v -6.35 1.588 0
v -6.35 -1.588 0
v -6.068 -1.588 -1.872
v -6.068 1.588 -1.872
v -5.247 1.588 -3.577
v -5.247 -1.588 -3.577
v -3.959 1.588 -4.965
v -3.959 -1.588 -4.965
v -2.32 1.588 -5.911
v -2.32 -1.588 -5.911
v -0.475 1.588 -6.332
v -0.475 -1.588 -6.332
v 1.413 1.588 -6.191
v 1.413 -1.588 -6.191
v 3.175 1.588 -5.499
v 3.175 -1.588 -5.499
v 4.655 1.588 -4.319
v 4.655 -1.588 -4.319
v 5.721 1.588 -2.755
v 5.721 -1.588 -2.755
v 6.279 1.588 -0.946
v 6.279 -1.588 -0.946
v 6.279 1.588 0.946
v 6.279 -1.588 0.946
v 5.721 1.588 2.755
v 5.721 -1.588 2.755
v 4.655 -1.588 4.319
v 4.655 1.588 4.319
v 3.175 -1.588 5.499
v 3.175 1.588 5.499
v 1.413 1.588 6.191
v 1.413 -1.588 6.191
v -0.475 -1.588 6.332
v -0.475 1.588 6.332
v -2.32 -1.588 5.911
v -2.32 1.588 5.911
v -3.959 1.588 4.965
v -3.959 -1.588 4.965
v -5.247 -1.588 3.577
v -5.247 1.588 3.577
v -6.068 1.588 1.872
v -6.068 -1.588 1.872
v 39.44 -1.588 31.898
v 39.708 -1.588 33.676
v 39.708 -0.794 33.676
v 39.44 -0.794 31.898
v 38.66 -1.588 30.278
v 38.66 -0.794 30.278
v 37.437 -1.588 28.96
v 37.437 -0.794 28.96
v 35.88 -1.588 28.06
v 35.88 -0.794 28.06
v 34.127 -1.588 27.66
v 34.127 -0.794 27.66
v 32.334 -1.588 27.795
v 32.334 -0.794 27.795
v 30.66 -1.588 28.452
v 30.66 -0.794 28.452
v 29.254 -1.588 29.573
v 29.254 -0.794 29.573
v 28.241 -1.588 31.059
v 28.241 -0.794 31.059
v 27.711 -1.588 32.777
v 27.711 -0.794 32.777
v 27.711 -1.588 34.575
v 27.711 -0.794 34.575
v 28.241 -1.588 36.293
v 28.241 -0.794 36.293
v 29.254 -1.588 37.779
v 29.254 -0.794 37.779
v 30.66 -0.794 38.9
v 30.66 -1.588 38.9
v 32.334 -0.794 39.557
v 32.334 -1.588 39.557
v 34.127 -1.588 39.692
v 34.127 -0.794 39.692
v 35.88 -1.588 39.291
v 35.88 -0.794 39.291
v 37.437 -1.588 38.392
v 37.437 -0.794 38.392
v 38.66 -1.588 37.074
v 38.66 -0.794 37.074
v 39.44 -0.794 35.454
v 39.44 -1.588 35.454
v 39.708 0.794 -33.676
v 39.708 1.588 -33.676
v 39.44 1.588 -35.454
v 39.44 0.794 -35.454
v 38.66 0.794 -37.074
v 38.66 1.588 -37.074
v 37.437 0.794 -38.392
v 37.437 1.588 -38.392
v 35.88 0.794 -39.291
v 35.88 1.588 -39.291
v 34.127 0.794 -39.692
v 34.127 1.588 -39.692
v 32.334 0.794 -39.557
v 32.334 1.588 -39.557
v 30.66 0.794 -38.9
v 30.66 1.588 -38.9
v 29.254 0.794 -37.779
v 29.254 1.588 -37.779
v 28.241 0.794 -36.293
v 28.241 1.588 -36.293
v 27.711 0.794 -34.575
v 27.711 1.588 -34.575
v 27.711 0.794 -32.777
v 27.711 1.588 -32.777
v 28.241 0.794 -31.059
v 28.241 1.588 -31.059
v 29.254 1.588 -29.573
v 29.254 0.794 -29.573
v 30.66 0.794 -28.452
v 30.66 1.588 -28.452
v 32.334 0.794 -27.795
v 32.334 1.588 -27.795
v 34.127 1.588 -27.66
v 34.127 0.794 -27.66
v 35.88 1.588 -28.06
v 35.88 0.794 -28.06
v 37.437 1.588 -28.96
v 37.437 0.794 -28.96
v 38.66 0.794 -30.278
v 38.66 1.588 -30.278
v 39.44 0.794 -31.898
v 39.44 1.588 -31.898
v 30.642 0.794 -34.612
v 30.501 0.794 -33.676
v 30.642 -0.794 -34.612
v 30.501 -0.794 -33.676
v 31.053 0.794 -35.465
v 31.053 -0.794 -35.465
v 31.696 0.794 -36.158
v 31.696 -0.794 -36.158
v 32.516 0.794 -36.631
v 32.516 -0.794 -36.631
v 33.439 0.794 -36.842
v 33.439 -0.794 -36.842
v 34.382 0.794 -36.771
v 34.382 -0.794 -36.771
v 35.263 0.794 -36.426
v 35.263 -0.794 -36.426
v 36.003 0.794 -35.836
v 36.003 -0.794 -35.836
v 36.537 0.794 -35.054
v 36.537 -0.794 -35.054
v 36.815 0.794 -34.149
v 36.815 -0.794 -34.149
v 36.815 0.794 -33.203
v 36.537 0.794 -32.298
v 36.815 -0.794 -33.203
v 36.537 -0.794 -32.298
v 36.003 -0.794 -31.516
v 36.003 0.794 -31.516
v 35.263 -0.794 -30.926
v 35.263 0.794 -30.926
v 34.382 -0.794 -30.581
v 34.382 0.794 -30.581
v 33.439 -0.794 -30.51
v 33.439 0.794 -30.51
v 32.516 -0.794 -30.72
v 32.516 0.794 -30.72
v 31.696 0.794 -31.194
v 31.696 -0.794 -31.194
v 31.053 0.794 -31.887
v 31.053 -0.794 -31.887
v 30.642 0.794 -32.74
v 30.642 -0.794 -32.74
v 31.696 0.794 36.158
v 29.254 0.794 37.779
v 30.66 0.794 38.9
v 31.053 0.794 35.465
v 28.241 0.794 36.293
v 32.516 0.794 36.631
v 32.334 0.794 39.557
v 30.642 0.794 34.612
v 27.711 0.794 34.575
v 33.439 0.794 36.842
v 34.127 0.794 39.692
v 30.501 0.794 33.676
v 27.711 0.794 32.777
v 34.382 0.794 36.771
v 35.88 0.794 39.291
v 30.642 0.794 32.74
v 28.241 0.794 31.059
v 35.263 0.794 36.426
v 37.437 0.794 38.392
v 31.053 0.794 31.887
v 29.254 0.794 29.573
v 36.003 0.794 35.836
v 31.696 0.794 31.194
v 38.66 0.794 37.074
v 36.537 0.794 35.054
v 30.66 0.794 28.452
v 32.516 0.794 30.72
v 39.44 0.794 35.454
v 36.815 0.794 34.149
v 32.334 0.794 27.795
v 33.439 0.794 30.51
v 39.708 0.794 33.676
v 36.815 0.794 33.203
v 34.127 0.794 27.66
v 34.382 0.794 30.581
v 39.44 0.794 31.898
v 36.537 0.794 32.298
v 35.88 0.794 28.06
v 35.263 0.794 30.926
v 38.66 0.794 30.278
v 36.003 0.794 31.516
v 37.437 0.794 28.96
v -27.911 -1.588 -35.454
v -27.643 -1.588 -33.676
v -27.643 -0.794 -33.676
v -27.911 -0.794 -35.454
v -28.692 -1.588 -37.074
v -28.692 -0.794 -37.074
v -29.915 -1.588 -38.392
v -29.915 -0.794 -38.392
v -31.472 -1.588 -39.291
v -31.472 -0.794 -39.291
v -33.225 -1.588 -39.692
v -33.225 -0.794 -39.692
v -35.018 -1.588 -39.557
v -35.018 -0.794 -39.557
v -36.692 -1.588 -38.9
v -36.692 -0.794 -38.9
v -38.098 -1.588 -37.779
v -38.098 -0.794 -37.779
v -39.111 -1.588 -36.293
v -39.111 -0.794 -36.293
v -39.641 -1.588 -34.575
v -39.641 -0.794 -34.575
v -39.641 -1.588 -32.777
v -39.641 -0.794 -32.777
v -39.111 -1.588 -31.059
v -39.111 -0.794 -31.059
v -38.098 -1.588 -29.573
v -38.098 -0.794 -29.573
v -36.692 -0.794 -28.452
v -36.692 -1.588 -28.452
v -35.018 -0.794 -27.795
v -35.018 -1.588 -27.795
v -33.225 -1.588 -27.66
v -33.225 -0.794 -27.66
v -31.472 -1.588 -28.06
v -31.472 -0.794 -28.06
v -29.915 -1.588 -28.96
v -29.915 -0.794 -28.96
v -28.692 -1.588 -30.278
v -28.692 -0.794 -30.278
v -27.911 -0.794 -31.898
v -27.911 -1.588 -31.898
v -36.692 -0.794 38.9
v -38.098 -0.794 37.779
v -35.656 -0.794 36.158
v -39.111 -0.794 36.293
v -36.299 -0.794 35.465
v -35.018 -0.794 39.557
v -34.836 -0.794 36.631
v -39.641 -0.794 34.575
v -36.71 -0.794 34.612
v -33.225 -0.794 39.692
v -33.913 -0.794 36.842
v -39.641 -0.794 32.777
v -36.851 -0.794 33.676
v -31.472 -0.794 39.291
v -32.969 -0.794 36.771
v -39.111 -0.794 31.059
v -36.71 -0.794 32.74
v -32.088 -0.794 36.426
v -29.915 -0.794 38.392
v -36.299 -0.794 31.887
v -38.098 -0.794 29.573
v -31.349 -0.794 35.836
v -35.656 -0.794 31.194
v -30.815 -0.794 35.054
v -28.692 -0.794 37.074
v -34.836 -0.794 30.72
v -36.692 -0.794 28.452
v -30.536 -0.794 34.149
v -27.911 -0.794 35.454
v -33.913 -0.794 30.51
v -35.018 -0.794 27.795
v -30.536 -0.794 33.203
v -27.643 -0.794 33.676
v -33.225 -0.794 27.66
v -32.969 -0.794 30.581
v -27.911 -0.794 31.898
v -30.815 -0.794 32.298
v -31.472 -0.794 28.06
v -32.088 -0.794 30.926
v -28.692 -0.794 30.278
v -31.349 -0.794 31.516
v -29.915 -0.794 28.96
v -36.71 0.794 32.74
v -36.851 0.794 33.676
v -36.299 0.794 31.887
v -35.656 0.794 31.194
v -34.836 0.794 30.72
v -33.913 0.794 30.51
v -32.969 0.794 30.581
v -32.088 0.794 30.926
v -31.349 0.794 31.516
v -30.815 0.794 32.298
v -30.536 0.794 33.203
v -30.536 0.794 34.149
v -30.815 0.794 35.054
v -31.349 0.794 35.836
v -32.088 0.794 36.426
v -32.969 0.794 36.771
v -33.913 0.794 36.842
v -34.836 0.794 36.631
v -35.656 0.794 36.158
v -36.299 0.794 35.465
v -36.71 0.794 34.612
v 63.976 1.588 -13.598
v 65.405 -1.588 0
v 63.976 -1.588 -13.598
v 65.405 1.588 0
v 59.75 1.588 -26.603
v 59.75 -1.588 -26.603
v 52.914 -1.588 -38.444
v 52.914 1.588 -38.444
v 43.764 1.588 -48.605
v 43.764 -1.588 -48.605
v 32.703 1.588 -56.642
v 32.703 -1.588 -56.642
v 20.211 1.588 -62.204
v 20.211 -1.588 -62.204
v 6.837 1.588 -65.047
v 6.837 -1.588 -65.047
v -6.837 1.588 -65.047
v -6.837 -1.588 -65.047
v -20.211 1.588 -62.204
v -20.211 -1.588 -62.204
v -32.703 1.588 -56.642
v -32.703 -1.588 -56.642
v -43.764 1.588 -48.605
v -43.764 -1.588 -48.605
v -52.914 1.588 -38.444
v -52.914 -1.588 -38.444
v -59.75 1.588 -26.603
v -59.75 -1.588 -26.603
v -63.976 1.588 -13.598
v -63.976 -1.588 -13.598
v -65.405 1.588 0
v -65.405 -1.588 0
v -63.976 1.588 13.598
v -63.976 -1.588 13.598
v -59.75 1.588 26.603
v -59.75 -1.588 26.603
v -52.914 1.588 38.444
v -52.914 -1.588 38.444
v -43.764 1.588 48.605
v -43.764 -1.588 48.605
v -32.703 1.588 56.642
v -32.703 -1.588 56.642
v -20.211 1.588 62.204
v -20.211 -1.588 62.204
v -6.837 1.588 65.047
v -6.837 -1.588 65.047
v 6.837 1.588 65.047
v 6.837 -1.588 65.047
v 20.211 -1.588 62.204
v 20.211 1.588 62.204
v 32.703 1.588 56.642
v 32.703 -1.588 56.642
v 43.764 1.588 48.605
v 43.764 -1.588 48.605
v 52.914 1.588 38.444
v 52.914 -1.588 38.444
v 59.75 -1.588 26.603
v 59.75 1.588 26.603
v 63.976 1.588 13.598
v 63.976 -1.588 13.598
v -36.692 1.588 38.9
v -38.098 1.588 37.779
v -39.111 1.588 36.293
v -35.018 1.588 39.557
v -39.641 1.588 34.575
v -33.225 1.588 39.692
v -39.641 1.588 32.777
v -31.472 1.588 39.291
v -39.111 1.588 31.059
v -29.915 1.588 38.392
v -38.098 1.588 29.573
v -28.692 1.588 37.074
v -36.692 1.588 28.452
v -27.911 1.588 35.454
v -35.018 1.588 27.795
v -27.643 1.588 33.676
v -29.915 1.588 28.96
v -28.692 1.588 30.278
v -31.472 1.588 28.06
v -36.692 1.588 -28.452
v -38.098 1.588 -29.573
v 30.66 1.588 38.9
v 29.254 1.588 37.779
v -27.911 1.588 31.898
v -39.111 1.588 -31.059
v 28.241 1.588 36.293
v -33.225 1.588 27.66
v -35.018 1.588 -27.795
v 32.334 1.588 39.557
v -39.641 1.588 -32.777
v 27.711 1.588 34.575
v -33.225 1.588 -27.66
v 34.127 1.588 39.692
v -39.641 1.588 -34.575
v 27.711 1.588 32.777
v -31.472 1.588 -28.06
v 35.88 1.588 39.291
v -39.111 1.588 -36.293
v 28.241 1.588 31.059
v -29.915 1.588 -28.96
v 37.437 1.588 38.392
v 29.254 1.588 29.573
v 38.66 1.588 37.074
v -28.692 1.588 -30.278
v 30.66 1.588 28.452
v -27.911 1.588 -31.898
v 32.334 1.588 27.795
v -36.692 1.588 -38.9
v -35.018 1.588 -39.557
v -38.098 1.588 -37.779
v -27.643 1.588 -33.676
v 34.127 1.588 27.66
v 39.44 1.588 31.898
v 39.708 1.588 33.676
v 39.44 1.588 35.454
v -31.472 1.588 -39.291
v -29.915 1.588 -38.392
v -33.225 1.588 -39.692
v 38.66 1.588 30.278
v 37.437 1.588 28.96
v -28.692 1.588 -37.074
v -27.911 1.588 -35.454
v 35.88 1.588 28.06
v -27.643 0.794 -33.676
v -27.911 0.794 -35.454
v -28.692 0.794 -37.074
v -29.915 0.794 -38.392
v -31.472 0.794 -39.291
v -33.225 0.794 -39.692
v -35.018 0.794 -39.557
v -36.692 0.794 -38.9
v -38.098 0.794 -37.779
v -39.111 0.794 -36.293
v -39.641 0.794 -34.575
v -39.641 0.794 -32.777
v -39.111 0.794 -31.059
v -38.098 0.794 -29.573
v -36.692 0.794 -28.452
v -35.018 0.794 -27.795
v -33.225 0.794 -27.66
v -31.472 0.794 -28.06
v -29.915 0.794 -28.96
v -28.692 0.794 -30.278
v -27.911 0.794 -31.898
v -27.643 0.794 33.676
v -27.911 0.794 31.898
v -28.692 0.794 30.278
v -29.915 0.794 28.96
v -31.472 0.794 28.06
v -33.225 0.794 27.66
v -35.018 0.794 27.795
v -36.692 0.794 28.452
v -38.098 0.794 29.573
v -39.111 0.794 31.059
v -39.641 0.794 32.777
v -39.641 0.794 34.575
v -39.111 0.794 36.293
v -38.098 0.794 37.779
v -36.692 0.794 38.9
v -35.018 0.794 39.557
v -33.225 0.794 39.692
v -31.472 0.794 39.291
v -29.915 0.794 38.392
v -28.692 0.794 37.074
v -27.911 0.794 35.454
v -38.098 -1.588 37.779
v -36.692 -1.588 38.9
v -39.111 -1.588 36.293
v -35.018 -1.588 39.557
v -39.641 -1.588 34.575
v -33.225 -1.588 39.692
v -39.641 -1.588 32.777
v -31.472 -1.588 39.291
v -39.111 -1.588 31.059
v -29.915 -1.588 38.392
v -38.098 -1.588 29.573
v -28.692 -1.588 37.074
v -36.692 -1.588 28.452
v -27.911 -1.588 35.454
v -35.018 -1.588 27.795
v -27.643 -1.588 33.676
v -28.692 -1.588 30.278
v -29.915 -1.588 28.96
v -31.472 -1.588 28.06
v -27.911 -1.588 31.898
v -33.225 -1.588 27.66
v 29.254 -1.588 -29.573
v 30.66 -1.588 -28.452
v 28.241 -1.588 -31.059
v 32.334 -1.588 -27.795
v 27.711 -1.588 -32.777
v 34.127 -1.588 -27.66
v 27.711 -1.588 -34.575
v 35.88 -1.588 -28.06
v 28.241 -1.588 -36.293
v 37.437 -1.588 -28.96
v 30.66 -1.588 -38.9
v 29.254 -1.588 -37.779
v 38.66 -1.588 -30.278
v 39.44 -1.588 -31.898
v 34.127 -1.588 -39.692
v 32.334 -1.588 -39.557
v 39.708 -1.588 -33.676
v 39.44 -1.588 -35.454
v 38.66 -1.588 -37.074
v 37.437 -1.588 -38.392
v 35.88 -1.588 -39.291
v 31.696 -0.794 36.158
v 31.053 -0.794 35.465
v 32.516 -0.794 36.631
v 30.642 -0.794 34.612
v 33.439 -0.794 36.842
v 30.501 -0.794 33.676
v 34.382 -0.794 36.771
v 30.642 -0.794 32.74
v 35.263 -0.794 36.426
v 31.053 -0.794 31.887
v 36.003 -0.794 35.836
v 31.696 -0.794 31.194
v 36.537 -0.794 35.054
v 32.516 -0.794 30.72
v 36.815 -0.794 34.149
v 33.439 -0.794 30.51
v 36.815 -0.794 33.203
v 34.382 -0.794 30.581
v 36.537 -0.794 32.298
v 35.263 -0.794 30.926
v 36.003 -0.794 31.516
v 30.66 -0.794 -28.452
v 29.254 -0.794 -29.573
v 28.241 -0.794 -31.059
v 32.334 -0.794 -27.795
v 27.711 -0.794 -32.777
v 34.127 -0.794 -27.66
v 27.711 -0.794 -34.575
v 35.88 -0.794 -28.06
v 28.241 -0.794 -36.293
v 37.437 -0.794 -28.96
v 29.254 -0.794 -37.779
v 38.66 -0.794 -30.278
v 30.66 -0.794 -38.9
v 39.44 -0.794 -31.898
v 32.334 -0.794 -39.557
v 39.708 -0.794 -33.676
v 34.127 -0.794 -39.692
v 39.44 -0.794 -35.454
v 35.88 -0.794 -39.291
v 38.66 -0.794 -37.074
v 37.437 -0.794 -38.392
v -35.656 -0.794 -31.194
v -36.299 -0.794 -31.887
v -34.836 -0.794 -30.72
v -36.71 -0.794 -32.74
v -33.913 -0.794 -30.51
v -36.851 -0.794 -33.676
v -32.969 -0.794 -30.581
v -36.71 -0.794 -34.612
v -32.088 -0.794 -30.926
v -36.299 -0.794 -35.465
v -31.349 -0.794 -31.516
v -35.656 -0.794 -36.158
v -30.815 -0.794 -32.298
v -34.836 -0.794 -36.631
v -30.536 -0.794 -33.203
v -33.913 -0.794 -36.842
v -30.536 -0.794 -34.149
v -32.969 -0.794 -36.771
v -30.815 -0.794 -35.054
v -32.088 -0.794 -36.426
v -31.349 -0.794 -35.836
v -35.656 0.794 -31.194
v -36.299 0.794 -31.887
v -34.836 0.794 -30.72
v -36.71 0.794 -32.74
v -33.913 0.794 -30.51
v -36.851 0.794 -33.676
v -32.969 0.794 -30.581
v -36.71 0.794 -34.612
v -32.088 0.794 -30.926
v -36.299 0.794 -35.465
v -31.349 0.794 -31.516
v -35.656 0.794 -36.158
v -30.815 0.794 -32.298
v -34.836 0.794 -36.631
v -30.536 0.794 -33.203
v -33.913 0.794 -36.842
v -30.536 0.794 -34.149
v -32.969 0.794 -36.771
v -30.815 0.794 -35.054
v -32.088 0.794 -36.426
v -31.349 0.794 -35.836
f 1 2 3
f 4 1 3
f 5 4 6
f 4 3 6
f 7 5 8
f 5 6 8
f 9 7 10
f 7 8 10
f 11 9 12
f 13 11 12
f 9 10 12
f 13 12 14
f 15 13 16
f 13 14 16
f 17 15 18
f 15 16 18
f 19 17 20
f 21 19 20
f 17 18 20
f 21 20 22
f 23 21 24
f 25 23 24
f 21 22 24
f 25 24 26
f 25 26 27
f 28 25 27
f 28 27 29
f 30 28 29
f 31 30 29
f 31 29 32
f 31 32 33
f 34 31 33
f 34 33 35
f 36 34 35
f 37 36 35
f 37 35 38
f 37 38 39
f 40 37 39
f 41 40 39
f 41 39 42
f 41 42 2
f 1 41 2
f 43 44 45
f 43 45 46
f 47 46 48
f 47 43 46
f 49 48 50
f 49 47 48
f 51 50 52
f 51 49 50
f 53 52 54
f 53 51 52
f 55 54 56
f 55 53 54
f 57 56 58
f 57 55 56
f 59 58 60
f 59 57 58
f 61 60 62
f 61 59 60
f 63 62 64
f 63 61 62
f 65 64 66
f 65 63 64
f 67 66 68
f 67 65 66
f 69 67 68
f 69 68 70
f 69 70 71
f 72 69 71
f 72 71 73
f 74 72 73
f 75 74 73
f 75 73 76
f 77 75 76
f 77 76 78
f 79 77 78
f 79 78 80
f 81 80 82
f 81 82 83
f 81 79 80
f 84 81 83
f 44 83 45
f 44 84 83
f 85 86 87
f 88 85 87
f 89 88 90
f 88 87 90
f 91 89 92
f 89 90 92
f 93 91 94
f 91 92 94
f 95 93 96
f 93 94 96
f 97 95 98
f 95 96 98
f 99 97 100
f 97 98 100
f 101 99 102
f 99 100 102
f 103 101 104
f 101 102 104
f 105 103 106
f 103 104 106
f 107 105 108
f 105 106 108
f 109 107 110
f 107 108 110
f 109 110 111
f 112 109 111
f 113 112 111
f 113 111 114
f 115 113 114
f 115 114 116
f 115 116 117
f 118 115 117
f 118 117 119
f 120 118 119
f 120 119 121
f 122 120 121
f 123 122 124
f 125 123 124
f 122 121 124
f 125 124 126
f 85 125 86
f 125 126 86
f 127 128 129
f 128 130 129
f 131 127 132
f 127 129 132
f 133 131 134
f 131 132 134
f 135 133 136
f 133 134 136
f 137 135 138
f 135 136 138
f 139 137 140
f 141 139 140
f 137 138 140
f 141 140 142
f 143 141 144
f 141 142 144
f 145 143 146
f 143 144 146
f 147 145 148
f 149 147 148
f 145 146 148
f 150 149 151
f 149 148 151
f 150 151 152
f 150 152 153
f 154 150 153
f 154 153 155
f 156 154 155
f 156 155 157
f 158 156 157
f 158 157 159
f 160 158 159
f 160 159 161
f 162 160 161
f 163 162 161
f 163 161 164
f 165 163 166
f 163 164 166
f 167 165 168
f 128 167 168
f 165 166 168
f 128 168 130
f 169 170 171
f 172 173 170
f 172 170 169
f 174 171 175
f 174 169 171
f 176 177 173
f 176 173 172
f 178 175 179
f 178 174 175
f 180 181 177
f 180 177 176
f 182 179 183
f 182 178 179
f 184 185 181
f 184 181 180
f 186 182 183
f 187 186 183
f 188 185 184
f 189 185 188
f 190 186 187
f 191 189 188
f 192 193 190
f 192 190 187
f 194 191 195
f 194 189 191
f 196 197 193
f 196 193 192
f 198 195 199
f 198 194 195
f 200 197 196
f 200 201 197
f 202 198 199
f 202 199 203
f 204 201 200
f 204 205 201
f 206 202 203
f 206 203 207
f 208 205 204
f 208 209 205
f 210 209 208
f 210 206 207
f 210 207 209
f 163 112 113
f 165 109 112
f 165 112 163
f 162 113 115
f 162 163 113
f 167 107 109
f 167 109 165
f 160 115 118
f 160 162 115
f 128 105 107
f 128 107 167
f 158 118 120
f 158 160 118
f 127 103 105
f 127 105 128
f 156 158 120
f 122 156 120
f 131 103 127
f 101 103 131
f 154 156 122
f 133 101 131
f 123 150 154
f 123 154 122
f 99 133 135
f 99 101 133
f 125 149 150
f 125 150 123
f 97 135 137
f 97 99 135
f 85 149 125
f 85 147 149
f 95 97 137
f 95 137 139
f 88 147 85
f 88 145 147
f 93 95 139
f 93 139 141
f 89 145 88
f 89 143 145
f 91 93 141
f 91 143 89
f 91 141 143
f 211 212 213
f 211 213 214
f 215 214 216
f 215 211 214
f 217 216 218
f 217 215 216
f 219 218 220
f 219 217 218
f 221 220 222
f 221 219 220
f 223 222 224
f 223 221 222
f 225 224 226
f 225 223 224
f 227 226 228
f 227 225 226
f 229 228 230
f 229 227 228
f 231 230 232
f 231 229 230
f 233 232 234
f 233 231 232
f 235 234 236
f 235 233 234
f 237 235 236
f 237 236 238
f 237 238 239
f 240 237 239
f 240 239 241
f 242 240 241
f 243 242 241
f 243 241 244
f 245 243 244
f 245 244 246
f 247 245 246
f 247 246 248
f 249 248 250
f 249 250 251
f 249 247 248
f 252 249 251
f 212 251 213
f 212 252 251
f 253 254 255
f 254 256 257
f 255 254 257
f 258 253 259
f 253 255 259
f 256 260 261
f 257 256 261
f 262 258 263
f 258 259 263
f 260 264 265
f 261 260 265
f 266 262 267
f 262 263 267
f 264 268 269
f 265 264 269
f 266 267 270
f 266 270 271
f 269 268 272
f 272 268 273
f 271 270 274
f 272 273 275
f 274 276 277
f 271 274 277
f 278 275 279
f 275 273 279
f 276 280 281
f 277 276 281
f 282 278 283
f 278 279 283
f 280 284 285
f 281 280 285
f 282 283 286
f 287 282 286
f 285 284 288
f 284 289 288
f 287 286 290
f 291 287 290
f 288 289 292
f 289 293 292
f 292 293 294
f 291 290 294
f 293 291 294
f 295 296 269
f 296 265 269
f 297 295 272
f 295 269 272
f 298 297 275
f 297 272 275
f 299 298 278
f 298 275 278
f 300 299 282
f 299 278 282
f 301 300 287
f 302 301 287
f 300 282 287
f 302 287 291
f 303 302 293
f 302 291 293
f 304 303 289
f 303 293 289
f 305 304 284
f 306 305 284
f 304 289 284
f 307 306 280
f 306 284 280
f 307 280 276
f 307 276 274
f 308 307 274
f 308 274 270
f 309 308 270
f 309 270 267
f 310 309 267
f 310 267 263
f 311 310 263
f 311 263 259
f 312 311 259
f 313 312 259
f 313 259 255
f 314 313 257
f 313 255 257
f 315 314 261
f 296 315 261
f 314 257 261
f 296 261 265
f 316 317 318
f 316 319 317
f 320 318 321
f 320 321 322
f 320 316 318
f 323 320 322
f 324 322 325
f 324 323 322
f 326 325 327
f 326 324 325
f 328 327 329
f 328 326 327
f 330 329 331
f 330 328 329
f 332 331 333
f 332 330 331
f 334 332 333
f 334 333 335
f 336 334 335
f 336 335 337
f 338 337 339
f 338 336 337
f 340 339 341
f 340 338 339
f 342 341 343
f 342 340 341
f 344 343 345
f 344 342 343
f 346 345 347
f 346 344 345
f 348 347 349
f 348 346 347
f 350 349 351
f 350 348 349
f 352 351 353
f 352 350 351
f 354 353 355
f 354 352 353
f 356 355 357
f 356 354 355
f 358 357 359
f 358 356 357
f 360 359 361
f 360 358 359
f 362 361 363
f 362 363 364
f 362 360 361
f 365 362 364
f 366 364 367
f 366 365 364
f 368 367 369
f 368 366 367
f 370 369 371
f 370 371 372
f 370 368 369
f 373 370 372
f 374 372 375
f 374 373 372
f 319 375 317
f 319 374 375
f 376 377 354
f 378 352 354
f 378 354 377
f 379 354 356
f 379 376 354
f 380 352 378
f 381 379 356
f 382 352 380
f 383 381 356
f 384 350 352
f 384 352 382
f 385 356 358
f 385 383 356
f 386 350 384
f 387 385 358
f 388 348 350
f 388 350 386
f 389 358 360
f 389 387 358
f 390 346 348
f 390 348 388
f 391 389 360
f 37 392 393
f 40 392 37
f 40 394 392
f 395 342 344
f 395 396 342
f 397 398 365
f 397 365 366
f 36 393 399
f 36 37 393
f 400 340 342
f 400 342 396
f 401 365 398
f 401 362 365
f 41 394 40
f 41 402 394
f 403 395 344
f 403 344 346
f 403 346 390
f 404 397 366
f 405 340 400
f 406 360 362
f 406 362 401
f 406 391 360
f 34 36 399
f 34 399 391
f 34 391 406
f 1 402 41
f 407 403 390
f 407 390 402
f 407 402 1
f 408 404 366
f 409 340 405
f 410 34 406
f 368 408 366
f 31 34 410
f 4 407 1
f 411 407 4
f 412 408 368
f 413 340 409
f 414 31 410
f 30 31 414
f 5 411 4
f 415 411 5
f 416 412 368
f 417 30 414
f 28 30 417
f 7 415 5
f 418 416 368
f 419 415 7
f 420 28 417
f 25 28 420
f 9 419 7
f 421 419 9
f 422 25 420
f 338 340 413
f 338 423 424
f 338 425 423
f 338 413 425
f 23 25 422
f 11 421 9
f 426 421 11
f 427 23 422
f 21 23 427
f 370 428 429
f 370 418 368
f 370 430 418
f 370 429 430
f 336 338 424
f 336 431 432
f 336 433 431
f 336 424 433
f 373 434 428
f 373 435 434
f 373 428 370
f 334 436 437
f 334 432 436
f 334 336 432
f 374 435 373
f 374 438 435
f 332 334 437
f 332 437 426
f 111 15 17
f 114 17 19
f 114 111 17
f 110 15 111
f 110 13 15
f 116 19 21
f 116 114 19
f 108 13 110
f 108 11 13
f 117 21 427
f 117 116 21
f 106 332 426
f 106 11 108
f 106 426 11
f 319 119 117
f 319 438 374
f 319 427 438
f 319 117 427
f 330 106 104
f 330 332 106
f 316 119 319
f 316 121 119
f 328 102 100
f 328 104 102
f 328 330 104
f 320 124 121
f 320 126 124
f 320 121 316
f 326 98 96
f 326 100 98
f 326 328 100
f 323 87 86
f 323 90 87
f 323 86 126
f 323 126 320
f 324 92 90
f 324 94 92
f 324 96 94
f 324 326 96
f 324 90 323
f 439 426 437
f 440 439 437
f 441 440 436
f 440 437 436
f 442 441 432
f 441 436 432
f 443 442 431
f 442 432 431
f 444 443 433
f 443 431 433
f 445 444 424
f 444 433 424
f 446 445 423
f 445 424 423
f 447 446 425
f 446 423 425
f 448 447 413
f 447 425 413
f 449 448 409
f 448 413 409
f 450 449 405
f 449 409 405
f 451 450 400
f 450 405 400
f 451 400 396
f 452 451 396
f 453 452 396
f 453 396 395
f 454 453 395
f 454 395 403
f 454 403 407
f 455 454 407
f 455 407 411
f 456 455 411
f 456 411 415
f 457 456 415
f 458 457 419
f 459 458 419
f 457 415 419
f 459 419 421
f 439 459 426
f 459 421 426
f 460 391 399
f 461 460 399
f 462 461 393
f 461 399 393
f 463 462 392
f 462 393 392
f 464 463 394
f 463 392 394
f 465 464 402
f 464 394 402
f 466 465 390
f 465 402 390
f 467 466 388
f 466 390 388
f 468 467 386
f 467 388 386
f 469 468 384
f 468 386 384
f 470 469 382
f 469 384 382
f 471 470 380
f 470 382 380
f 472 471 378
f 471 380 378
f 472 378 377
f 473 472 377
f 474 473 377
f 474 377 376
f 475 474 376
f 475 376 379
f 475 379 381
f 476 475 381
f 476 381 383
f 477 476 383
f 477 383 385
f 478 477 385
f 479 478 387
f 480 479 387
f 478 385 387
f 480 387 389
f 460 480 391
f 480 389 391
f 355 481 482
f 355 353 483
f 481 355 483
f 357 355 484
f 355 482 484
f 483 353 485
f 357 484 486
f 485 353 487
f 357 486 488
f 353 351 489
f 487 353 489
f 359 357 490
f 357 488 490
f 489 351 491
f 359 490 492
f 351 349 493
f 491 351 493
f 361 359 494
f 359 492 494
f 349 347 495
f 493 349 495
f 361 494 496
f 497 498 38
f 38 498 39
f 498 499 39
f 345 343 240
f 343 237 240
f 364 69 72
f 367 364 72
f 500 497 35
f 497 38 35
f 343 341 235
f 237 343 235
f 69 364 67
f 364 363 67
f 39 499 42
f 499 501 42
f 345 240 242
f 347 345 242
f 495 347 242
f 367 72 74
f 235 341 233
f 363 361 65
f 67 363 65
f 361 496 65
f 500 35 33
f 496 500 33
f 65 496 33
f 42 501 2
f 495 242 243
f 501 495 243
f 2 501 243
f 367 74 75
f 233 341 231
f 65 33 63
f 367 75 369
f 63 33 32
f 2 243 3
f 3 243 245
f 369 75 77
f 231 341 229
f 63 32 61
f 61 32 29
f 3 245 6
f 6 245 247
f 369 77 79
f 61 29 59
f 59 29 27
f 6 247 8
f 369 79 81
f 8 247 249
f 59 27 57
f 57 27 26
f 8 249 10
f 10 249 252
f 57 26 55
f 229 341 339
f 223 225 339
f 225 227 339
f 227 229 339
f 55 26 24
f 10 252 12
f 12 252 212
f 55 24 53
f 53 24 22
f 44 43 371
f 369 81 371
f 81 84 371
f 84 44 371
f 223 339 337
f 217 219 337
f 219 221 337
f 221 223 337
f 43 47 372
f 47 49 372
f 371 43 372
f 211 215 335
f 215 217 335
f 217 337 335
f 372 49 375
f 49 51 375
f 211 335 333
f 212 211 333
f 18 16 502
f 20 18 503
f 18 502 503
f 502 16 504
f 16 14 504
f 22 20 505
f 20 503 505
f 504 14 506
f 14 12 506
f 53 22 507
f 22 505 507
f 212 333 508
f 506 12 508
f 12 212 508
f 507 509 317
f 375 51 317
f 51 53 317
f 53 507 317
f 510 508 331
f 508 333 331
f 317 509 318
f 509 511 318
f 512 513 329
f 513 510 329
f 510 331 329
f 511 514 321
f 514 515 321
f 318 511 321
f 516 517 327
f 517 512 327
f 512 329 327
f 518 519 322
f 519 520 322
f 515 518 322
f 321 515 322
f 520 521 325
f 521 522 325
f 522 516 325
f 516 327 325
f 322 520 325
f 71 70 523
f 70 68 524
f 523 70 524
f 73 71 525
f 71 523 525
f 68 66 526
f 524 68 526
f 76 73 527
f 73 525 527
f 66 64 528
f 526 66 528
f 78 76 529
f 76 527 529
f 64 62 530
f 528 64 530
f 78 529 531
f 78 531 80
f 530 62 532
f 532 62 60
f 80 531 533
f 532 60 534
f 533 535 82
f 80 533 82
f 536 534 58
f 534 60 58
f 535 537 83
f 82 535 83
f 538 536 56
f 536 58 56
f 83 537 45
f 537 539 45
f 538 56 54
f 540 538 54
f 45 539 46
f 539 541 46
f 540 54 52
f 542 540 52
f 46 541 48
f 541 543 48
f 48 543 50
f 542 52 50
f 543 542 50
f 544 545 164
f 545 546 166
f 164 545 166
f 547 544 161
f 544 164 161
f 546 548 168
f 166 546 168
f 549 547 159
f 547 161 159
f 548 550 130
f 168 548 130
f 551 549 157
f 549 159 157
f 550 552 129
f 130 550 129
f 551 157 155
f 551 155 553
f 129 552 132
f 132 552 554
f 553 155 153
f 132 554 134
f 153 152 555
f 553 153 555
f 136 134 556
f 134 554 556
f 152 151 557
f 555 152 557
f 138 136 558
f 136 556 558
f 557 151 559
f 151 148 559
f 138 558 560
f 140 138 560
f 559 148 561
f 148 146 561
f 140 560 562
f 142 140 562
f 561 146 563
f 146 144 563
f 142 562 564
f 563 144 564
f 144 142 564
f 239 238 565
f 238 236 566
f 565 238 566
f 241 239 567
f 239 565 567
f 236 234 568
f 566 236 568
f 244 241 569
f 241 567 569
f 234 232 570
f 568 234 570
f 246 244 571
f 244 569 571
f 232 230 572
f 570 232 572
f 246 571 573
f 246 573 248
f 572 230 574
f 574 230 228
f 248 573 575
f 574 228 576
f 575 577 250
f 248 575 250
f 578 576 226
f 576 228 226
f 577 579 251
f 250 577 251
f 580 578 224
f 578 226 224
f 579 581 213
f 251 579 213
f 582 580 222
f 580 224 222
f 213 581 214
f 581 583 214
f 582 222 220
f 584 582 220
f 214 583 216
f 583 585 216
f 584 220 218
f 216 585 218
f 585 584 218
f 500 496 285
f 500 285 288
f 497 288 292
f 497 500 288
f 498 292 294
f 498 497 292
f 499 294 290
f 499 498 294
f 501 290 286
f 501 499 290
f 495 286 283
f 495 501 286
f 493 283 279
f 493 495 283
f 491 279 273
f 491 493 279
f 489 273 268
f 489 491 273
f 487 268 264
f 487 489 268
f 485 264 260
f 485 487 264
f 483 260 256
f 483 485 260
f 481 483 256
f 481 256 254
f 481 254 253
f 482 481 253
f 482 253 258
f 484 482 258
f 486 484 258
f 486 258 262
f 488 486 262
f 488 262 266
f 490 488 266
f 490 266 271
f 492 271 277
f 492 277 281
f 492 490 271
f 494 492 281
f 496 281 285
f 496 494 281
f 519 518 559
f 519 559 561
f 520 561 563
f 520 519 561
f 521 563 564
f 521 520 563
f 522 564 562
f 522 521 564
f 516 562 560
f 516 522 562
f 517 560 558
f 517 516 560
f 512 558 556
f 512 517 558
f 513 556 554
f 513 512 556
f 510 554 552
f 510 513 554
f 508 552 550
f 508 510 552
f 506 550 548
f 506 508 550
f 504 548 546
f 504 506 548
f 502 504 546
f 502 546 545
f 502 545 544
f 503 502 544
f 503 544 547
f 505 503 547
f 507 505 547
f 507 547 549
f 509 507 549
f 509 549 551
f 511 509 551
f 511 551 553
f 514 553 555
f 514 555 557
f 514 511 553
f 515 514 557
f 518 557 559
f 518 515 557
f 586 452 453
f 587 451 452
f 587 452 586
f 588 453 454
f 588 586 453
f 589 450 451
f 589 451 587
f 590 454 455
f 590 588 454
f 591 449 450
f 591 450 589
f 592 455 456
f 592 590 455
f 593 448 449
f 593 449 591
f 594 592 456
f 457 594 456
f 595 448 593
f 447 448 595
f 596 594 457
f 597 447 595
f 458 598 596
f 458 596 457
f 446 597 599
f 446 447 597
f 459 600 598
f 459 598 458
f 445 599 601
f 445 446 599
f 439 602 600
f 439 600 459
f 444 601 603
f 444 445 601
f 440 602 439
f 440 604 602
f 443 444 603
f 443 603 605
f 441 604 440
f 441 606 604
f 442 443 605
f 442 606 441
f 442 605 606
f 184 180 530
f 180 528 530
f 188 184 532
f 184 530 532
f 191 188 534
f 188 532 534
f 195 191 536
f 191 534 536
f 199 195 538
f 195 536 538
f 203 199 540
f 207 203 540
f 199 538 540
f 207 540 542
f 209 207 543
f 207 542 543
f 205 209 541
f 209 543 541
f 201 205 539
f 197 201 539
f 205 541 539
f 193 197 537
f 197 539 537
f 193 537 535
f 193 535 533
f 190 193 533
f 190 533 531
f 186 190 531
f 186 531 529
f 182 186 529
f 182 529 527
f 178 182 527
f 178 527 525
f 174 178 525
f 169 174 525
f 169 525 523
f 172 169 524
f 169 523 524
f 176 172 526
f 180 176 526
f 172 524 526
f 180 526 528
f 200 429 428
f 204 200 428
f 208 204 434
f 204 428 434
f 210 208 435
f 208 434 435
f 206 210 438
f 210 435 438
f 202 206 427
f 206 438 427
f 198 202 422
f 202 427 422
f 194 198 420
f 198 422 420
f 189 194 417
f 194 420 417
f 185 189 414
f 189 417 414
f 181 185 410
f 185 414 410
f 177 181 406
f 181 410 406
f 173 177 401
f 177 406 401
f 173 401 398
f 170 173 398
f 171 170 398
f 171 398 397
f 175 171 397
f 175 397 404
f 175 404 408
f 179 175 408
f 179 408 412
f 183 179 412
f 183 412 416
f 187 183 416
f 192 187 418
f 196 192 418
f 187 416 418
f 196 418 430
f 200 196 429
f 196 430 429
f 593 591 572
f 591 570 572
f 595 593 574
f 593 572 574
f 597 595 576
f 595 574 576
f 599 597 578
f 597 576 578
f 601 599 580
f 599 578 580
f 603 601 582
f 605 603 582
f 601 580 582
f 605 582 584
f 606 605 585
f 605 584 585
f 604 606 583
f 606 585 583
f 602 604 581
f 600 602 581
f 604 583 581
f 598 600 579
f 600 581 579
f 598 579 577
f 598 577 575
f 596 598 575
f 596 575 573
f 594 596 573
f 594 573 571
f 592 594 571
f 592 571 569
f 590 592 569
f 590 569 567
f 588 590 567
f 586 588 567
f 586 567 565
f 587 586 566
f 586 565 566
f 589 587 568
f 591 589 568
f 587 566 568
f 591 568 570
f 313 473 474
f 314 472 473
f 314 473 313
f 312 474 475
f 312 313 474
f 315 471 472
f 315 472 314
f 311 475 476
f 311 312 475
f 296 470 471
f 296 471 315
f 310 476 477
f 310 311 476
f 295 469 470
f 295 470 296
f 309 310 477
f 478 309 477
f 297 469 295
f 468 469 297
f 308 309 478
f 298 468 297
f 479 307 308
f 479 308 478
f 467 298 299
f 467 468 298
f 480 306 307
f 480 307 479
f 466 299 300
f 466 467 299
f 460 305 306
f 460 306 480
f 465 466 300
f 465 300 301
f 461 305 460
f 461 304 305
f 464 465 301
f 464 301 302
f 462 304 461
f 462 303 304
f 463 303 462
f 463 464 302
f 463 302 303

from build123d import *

# Parameters (mm, degrees)
SKETCH2_R                   = 65.405
BOSS_EXTRUDE1_DEPTH         = 1.5875
F_1_4_0_25_DIAMETER_HOLE1_D = 6.35
F_1_2_0_5_DIAMETER_HOLE1_D  = 12.7
SKETCH10_R                  = 6.0325
CUT_EXTRUDE1_DEPTH          = 0.79375


with BuildPart() as part:
    # Sketch2 → Boss-Extrude1 (new body, symmetric)
    with BuildSketch(Plane(origin=(0, 0, 0), x_dir=(1, 0, 0), z_dir=(0, 1, 0))):
        Circle(SKETCH2_R)
    extrude(amount=BOSS_EXTRUDE1_DEPTH, both=True)

    # 1/4 (0.25) Diameter Hole1 (through all)
    with Locations(Plane(origin=(0, 1.5875, 0), x_dir=(1, 0, 0), z_dir=(0, 1, 0))):
        with Locations((-33.675960454, -33.675960454), (-33.675960454, 33.675960454), (33.675960454, 33.675960454), (33.675960454, -33.675960454)):
            Hole(F_1_4_0_25_DIAMETER_HOLE1_D / 2)

    # 1/2 (0.5) Diameter Hole1 (through all)
    with Locations(Plane(origin=(0, 1.5875, 0), x_dir=(1, 0, 0), z_dir=(0, 1, 0))):
        with Locations((0, 0)):
            Hole(F_1_2_0_5_DIAMETER_HOLE1_D / 2)

    # Sketch10 → Cut-Extrude1 (cut)
    with BuildSketch(Plane(origin=(0, 1.5875, 0), x_dir=(1, 0, 0), z_dir=(0, 1, 0))):
        with Locations((-33.675960454, 33.675960454)):
            Circle(SKETCH10_R)
        with Locations((33.675960454, 33.675960454)):
            Circle(SKETCH10_R)
        with Locations((33.675960454, -33.675960454)):
            Circle(SKETCH10_R)
        with Locations((-33.675960454, -33.675960454)):
            Circle(SKETCH10_R)
    cut_extrude1 = extrude(amount=-CUT_EXTRUDE1_DEPTH, mode=Mode.SUBTRACT)

    # Mirror1: Cut-Extrude1 across plane
    add(cut_extrude1.mirror(Plane.ZX), mode=Mode.SUBTRACT)


solid = part.part
